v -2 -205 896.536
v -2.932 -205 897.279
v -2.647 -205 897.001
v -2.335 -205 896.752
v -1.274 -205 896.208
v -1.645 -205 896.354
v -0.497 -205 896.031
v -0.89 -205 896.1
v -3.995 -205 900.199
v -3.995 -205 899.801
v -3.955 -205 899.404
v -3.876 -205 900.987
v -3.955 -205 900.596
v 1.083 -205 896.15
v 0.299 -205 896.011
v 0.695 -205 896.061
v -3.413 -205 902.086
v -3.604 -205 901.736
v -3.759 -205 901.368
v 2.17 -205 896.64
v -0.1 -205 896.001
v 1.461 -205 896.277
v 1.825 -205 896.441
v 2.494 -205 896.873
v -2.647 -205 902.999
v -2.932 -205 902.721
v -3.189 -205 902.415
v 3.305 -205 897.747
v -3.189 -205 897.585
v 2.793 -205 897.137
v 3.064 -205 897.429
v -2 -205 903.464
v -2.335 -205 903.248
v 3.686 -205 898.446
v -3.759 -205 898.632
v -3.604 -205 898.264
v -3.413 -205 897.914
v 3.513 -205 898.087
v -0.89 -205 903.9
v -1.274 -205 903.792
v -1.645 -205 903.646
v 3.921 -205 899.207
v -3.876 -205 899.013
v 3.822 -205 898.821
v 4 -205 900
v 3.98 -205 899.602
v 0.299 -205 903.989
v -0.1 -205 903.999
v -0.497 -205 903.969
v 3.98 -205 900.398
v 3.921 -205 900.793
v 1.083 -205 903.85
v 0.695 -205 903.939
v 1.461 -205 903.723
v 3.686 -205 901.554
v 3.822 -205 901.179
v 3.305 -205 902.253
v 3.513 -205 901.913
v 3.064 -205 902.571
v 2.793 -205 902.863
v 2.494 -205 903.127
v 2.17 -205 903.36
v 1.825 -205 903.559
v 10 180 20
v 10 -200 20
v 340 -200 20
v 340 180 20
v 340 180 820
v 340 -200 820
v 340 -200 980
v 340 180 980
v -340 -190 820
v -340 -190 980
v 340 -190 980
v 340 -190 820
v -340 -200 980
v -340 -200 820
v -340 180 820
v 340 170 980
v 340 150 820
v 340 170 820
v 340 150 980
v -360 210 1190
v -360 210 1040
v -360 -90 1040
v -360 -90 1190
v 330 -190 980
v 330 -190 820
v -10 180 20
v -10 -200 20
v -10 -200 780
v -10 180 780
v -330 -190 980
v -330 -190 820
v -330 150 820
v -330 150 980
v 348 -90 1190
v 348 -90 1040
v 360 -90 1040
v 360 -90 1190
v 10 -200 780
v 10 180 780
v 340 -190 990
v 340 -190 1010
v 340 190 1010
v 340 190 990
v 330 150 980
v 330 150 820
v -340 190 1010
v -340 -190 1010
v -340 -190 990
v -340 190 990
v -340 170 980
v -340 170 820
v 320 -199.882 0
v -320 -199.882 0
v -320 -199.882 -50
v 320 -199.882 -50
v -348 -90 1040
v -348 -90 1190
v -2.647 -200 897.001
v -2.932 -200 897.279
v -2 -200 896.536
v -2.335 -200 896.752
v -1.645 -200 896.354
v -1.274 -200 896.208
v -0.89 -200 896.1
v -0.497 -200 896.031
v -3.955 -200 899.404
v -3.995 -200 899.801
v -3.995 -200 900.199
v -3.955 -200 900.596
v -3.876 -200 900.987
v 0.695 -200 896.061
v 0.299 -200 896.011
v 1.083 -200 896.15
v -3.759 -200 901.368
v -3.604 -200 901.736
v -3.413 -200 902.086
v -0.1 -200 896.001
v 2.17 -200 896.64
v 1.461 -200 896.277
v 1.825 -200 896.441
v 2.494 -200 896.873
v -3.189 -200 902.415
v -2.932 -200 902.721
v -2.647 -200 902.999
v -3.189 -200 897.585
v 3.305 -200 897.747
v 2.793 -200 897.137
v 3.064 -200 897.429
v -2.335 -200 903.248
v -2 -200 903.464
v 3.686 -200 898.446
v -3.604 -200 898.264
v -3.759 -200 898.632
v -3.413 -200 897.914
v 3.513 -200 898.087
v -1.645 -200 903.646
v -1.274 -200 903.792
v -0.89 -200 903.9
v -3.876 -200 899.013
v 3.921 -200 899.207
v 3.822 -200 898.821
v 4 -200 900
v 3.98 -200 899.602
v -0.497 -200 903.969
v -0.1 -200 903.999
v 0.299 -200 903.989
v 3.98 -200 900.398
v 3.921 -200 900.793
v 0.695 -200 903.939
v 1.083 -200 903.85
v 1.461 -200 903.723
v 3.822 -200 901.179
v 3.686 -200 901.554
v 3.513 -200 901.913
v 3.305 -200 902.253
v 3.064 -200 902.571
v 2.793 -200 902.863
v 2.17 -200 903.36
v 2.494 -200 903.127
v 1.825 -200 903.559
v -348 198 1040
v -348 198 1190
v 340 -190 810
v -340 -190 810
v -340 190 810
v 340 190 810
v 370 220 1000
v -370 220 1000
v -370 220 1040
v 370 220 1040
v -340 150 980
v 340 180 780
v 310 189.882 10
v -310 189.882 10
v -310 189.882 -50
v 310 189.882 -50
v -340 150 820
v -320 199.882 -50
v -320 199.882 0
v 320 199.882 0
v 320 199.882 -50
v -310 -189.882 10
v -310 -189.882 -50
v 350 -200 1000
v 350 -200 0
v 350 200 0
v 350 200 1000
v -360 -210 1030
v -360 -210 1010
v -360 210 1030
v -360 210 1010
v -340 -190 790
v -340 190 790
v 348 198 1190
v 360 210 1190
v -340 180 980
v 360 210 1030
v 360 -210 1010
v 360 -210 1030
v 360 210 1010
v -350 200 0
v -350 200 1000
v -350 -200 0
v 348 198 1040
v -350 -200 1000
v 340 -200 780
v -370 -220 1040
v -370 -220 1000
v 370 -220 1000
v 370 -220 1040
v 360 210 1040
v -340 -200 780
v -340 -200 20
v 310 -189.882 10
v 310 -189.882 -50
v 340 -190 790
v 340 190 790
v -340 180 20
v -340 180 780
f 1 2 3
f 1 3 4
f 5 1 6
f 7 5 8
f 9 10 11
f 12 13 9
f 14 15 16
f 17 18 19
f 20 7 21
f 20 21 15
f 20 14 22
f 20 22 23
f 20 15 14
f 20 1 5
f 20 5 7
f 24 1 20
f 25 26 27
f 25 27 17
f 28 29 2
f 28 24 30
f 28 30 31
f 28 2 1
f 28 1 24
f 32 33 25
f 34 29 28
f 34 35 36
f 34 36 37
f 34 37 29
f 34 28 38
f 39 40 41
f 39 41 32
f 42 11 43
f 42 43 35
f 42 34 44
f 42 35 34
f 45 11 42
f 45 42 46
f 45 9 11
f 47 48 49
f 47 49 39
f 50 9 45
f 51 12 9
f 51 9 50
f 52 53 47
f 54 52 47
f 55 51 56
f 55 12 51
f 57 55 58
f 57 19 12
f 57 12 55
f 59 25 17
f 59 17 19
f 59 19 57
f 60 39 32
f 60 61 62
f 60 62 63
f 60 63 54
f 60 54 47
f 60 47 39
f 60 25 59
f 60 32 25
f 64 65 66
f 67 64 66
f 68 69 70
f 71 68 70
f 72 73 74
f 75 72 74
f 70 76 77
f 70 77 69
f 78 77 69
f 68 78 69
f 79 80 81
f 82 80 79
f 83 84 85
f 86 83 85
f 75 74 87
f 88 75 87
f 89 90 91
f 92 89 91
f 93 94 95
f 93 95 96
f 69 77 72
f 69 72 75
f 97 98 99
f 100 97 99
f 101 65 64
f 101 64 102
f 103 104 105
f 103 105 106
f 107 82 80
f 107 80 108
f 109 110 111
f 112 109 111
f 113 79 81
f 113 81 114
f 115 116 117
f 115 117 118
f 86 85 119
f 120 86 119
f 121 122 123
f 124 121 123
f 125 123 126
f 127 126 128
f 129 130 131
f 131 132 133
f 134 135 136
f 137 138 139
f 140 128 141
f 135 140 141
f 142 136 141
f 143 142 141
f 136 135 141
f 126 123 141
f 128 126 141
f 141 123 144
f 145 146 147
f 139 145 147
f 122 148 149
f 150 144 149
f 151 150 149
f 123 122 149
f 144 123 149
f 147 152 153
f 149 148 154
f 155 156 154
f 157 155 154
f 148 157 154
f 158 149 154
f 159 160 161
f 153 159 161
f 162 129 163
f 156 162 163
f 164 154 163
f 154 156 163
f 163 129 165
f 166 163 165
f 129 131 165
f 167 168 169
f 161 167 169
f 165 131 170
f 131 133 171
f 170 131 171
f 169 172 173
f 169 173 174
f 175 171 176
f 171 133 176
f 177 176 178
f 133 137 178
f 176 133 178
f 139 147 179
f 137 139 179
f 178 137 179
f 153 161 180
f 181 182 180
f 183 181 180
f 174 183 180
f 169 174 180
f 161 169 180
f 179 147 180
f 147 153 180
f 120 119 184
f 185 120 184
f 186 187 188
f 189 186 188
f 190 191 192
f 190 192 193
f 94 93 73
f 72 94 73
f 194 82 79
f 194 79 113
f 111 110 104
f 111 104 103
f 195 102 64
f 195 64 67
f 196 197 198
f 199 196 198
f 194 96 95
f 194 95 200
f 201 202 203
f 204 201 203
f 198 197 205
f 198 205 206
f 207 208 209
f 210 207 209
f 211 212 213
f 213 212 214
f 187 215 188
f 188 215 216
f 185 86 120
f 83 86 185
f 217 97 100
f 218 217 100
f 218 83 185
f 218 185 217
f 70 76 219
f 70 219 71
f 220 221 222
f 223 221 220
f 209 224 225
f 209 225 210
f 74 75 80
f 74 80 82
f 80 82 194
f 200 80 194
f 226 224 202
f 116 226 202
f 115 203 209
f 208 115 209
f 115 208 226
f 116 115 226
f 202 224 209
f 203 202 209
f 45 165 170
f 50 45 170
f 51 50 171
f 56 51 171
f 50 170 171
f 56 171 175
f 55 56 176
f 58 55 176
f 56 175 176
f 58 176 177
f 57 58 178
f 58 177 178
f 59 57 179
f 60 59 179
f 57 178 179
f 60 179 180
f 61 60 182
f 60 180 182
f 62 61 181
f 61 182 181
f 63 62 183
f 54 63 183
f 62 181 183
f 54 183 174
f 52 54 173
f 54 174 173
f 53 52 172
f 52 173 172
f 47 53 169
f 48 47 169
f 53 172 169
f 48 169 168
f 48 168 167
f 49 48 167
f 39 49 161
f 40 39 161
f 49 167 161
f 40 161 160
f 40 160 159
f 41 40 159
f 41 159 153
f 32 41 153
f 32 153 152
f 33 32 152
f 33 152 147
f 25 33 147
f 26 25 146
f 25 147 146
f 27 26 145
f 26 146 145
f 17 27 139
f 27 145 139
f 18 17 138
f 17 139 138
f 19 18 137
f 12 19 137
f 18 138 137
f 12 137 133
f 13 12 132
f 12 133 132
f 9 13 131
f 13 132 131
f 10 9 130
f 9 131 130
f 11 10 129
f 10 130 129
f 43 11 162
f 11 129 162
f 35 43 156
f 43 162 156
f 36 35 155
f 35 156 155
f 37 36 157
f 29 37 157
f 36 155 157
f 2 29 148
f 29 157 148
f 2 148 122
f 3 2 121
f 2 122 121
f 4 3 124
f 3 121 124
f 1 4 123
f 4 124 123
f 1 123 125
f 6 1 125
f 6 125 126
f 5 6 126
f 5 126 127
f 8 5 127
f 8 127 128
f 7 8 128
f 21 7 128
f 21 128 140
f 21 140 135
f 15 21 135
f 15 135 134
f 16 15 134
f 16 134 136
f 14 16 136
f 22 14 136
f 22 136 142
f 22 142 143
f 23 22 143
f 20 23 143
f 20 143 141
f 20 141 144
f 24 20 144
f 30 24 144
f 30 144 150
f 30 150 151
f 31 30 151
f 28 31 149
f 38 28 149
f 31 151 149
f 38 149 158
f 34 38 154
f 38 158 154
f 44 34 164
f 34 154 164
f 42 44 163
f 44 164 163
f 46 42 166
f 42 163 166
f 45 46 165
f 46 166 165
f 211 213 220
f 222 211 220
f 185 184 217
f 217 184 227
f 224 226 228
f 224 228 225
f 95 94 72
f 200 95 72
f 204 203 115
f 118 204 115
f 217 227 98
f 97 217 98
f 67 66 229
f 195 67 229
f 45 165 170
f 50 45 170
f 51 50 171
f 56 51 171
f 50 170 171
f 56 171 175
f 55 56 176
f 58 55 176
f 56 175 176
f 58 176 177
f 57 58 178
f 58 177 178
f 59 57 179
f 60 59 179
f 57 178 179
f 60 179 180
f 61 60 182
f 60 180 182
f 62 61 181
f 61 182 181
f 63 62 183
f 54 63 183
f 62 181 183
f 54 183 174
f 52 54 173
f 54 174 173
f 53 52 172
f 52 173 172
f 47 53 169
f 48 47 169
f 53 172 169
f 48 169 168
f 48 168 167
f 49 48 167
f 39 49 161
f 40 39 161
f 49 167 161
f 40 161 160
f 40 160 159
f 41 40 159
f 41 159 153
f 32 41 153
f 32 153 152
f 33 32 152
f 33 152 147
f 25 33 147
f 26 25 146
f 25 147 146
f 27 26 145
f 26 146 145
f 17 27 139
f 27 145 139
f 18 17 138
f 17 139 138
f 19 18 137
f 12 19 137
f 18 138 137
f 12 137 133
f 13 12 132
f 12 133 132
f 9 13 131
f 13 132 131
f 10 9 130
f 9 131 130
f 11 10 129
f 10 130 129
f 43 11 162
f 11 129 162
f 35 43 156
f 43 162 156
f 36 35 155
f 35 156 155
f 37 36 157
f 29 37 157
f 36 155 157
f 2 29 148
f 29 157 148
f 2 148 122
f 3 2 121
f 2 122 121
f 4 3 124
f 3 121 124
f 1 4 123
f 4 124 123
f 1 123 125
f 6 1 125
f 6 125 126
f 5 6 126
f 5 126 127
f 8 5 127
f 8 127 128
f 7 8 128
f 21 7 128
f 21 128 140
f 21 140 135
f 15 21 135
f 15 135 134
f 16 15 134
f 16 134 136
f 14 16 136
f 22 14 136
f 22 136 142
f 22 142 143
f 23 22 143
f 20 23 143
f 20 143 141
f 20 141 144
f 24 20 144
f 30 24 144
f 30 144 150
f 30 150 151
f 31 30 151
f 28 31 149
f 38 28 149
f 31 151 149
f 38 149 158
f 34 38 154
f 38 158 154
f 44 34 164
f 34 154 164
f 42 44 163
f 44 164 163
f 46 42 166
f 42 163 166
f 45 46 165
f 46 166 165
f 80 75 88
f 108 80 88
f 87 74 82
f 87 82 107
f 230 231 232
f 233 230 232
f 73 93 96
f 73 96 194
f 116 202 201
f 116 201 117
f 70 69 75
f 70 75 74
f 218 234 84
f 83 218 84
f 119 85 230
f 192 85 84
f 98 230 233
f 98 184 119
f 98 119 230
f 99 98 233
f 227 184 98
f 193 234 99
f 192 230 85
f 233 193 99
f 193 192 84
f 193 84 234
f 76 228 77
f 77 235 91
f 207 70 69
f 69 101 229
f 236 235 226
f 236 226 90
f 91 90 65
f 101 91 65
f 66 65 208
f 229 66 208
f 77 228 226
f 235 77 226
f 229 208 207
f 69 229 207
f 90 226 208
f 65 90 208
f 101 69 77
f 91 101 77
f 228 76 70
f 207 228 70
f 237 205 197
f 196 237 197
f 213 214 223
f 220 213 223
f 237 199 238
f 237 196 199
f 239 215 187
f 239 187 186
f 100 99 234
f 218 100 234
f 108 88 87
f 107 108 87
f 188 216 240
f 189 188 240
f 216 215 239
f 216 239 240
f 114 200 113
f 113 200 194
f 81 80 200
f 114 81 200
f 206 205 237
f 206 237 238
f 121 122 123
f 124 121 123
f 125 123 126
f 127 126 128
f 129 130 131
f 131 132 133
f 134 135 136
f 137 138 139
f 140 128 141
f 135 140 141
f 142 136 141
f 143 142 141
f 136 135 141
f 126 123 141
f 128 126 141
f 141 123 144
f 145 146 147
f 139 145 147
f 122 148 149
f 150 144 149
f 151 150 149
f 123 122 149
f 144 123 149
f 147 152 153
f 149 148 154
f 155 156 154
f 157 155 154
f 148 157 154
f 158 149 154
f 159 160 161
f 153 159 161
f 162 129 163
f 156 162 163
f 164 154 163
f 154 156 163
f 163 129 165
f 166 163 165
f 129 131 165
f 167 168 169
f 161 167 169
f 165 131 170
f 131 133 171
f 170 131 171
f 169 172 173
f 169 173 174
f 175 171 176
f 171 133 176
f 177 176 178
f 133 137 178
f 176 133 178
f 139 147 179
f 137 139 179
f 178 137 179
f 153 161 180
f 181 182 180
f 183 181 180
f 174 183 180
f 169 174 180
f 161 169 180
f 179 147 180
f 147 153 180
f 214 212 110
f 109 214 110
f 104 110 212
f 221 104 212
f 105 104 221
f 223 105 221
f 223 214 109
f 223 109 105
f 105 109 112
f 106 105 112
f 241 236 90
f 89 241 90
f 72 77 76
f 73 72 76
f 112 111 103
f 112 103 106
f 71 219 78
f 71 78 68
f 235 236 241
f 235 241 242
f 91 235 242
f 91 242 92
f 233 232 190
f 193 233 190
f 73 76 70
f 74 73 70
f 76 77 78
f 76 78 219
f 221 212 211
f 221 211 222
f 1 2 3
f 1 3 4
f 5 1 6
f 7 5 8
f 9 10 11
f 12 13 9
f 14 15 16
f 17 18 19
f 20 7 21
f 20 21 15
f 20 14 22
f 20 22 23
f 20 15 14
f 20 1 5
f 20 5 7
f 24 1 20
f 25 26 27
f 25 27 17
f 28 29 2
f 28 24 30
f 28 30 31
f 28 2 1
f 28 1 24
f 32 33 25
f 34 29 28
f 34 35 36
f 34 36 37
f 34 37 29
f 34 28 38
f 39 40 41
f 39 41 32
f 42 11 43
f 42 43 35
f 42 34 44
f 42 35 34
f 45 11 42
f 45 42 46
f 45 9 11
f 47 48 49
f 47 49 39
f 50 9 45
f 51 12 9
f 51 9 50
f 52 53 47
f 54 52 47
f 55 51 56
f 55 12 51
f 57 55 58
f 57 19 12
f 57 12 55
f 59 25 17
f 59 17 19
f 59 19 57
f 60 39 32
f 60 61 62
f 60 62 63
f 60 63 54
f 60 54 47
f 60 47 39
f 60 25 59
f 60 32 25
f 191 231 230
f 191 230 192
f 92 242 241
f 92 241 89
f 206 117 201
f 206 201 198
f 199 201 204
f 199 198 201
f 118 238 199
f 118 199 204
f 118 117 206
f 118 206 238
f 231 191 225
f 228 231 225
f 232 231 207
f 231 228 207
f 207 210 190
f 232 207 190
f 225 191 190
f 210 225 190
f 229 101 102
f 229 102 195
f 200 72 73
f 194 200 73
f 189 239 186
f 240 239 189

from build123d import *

# Parameters (mm, degrees)
F0_W          = 700
F0_H          = 400
F1_DEPTH      = 1000
F2_W          = 330
F2_H          = 760
F2_W_2        = 680
F2_H_2        = 160
F3_DEPTH      = 380
F4_W          = 680
F4_H          = 160
F5_DEPTH      = 10
F6_W          = 10
F6_H          = 160
F7_DEPTH      = 340
F8_W          = 680
F8_H          = 160
F9_DEPTH      = 20
F10_R         = 4
F11_DEPTH     = 5
F12_DEPTH     = 5
F13_W         = 740
F13_H         = 440
F14_DEPTH     = 40
F15_W         = 640
F15_H         = 399.7640275955
F16_DEPTH     = 50
F17_T         = 10
F17_T3_DEPTH  = 720
F17_T5_DEPTH  = 420
F17_T7_DEPTH  = 660
F17_T9_DEPTH  = 419.7640275955
F17_T11_DEPTH = 400
F17_T13_DEPTH = 700
F17_T15_DEPTH = 180
F17_T17_DEPTH = 350
F17_T19_DEPTH = 780
F17_T21_DEPTH = 350
F19_DEPTH     = 150


# Not quite as in the source:
# - a shell that OpenCascade refuses in one call is made with other operations: the cavity is built on its own and cut out


with BuildPart() as f1:
    # F0 (on Top) → F1 (new body)
    with BuildSketch(Plane.XY):
        Rectangle(F0_W, F0_H)
    extrude(amount=F1_DEPTH)

    # F2 (on face) → F3 (cut)
    with BuildSketch(Plane.XZ.offset(200)):
        with Locations((-175, 400)):
            Rectangle(F2_W, F2_H)
        with Locations((175, 400)):
            Rectangle(F2_W, F2_H)
        with Locations((0, 900)):
            Rectangle(F2_W_2, F2_H_2)
    extrude(amount=-F3_DEPTH, mode=Mode.SUBTRACT)

    # F13 (on face) → F14 (join)
    with BuildSketch(Plane.XY.offset(1000)):
        Rectangle(F13_W, F13_H)
    extrude(amount=F14_DEPTH)

    # F15 (on face) → F16 (join)
    with BuildSketch(Plane(origin=(0, 0, 0), x_dir=(1, 0, 0), z_dir=(0, 0, -1))):
        Rectangle(F15_W, F15_H)
    extrude(amount=F16_DEPTH)

    # F17: shell of thickness 10, made by hand


with BuildPart() as f5:
    # F4 (on face) → F5 (new body)
    with BuildSketch(Plane.XZ.offset(200)):
        with Locations((0, 900)):
            Rectangle(F4_W, F4_H)
    extrude(amount=-F5_DEPTH)


with BuildPart() as f7:
    # F6 (on face) → F7 (new body)
    with BuildSketch(Plane(origin=(0, -190, 0), x_dir=(-1, 0, 0), z_dir=(0, 1, 0))):
        with Locations((-335, 900)):
            Rectangle(F6_W, F6_H)
    extrude(amount=F7_DEPTH)


with BuildPart() as f7b:
    # F6 (on face) → F7, piece 2 (new body)
    with BuildSketch(Plane(origin=(0, -190, 0), x_dir=(-1, 0, 0), z_dir=(0, 1, 0))):
        with Locations((335, 900)):
            Rectangle(F6_W, F6_H)
    extrude(amount=F7_DEPTH)


with BuildPart() as f9:
    # F8 (on face) → F9 (new body)
    with BuildSketch(Plane(origin=(0, 150, 0), x_dir=(-1, 0, 0), z_dir=(0, 1, 0))):
        with Locations((0, 900)):
            Rectangle(F8_W, F8_H)
    extrude(amount=F9_DEPTH)


with BuildPart() as f11:
    # F10 (on face) → F11 (new body)
    with BuildSketch(Plane.XZ.offset(200)):
        with Locations((0, 900)):
            Circle(F10_R)
    extrude(amount=F11_DEPTH)


with BuildPart() as f12:
    # F10 (on face) → F12 (new body)
    with BuildSketch(Plane.XZ.offset(200)):
        with Locations((0, 900)):
            Circle(F10_R)
    extrude(amount=F12_DEPTH)


with BuildPart() as f17_core1:
    # F17_t2: copy of F1
    add(f1.part)

    # the walls: a layer under each face that stays
    f17_faces = [f17_core1.faces().sort_by_distance(p)[0] for p in [
        (0, -220, 1020),
        (-370, 0, 1020),
        (370, 0, 1020),
        (-345.3333333333, -205.3333333333, 1000),
        (0, 0, 1040),
        (0, 220, 1020),
        (0, -200, 500),
        (350, 0, 500),
        (0, 200, 500),
        (-350, 0, 500),
        (-326.6666666667, -186.6666666667, 0),
        (0, -10, 980),
        (340, -10, 900),
        (0, -10, 820),
        (-340, -10, 900),
        (-175, -10, 780),
        (-10, -10, 400),
        (-175, -10, 20),
        (-340, -10, 400),
        (175, -10, 20),
        (10, -10, 400),
        (175, -10, 780),
        (340, -10, 400),
        (0, -199.8820137978, -25),
        (320, 0, -25),
        (0, 199.8820137978, -25),
        (-320, 0, -25),
        (0, 180, 900),
        (-175, 180, 400),
        (175, 180, 400),
    ]]
    thicken(f17_faces, amount=-F17_T, mode=Mode.SUBTRACT)

    # F17_s4 → F17_t3 (cut)
    with BuildSketch(Plane.YZ.offset(-360)):
        Polygon((-200.1, 999.9), (-200, 1010), (-190, 1010), (-190, 1000), align=None)
        Polygon((200.1, 999.9), (200, 1010), (190, 1010), (190, 1000), align=None)
    extrude(amount=F17_T3_DEPTH, mode=Mode.SUBTRACT)

    # F17_s6 → F17_t5 (cut)
    with BuildSketch(Plane.XZ.offset(-210)):
        Polygon((350.1, 999.9), (350, 1010), (340, 1010), (340, 1000), align=None)
        Polygon((-350.1, 999.9), (-350, 1010), (-340, 1010), (-340, 1000), align=None)
    extrude(amount=F17_T5_DEPTH, mode=Mode.SUBTRACT)

    # F17_s8 → F17_t7 (cut)
    with BuildSketch(Plane.YZ.offset(-330)):
        Polygon((-199.9820137978, -0.1), (-199.8820137978, 10), (-189.8820137978, 10), (-189.8820137978, 0), align=None)
        Polygon((199.9820137978, -0.1), (199.8820137978, 10), (189.8820137978, 10), (189.8820137978, 0), align=None)
    extrude(amount=F17_T7_DEPTH, mode=Mode.SUBTRACT)

    # F17_s10 → F17_t9 (cut)
    with BuildSketch(Plane.XZ.offset(-209.8820137978)):
        Polygon((320.1, -0.1), (320, 10), (310, 10), (310, 0), align=None)
        Polygon((-320.1, -0.1), (-320, 10), (-310, 10), (-310, 0), align=None)
    extrude(amount=F17_T9_DEPTH, mode=Mode.SUBTRACT)

    # F17_s12 → F17_t11 (cut)
    with BuildSketch(Plane.XZ.offset(-190)):
        Polygon((339.9, 979.9), (340, 990), (350, 990), (350, 980), align=None)
        Polygon((-339.9, 979.9), (-340, 990), (-350, 990), (-350, 980), align=None)
        Polygon((339.9, 820.1), (350, 820), (350, 810), (340, 810), align=None)
        Polygon((-339.9, 820.1), (-340, 810), (-350, 810), (-350, 820), align=None)
        Polygon((-10.1, 779.9), (-10, 790), (0, 790), (0, 780), align=None)
        Polygon((-339.9, 779.9), (-340, 790), (-350, 790), (-350, 780), align=None)
        Polygon((-10.1, 20.1), (0, 20), (0, 10), (-10, 10), align=None)
        Polygon((-339.9, 20.1), (-340, 10), (-350, 10), (-350, 20), align=None)
        Polygon((10.1, 20.1), (10, 10), (0, 10), (0, 20), align=None)
        Polygon((339.9, 20.1), (340, 10), (350, 10), (350, 20), align=None)
        Polygon((10.1, 779.9), (0, 780), (0, 790), (10, 790), align=None)
        Polygon((339.9, 779.9), (340, 790), (350, 790), (350, 780), align=None)
    extrude(amount=F17_T11_DEPTH, mode=Mode.SUBTRACT)

    # F17_s14 → F17_t13 (cut)
    with BuildSketch(Plane.YZ.offset(-350)):
        Polygon((179.9, 979.9), (180, 990), (190, 990), (190, 980), align=None)
        Polygon((179.9, 820.1), (180, 810), (190, 810), (190, 820), align=None)
    extrude(amount=F17_T13_DEPTH, mode=Mode.SUBTRACT)

    # F17_s16 → F17_t15 (cut)
    with BuildSketch(Plane.XY.offset(810)):
        Polygon((339.9, 179.9), (350, 180), (350, 190), (340, 190), align=None)
        Polygon((-339.9, 179.9), (-350, 180), (-350, 190), (-340, 190), align=None)
    extrude(amount=F17_T15_DEPTH, mode=Mode.SUBTRACT)

    # F17_s18 → F17_t17 (cut)
    with BuildSketch(Plane.YZ.offset(-350)):
        Polygon((179.9, 779.9), (180, 790), (190, 790), (190, 780), align=None)
        Polygon((179.9, 20.1), (180, 10), (190, 10), (190, 20), align=None)
    extrude(amount=F17_T17_DEPTH, mode=Mode.SUBTRACT)

    # F17_s20 → F17_t19 (cut)
    with BuildSketch(Plane.XY.offset(10)):
        Polygon((-10.1, 179.9), (0, 180), (0, 190), (-10, 190), align=None)
        Polygon((-339.9, 179.9), (-350, 180), (-350, 190), (-340, 190), align=None)
        Polygon((10.1, 179.9), (0, 180), (0, 190), (10, 190), align=None)
        Polygon((339.9, 179.9), (350, 180), (350, 190), (340, 190), align=None)
    extrude(amount=F17_T19_DEPTH, mode=Mode.SUBTRACT)

    # F17_s22 → F17_t21 (cut)
    with BuildSketch(Plane.YZ):
        Polygon((179.9, 20.1), (180, 10), (190, 10), (190, 20), align=None)
        Polygon((179.9, 779.9), (180, 790), (190, 790), (190, 780), align=None)
    extrude(amount=F17_T21_DEPTH, mode=Mode.SUBTRACT)


with BuildPart() as f1_1:
    add(f1.part)

    # what is left inside the walls is the cavity
    f17_cavity = [f17_core1.part.solids().sort_by_distance(p)[0] for p in [
        (0, -70, 1029.9),
        (103.333333, 0, 9.9),
        (113.333333, 0, 809.9),
    ]]
    add(f17_cavity, mode=Mode.SUBTRACT)

    # F18 (on face) → F19 (join)
    with BuildSketch(Plane.XY.offset(1040)):
        Polygon((-348, 198), (348, 198), (348, -90), (360, -90), (360, 198), (360, 210), (348, 210), (-348, 210), (-360, 210), (-360, 198), (-360, -90), (-348, -90), align=None)
    extrude(amount=F19_DEPTH)


solid = Compound([f5.part, f7.part, f7b.part, f9.part, f11.part, f12.part, f1_1.part])
